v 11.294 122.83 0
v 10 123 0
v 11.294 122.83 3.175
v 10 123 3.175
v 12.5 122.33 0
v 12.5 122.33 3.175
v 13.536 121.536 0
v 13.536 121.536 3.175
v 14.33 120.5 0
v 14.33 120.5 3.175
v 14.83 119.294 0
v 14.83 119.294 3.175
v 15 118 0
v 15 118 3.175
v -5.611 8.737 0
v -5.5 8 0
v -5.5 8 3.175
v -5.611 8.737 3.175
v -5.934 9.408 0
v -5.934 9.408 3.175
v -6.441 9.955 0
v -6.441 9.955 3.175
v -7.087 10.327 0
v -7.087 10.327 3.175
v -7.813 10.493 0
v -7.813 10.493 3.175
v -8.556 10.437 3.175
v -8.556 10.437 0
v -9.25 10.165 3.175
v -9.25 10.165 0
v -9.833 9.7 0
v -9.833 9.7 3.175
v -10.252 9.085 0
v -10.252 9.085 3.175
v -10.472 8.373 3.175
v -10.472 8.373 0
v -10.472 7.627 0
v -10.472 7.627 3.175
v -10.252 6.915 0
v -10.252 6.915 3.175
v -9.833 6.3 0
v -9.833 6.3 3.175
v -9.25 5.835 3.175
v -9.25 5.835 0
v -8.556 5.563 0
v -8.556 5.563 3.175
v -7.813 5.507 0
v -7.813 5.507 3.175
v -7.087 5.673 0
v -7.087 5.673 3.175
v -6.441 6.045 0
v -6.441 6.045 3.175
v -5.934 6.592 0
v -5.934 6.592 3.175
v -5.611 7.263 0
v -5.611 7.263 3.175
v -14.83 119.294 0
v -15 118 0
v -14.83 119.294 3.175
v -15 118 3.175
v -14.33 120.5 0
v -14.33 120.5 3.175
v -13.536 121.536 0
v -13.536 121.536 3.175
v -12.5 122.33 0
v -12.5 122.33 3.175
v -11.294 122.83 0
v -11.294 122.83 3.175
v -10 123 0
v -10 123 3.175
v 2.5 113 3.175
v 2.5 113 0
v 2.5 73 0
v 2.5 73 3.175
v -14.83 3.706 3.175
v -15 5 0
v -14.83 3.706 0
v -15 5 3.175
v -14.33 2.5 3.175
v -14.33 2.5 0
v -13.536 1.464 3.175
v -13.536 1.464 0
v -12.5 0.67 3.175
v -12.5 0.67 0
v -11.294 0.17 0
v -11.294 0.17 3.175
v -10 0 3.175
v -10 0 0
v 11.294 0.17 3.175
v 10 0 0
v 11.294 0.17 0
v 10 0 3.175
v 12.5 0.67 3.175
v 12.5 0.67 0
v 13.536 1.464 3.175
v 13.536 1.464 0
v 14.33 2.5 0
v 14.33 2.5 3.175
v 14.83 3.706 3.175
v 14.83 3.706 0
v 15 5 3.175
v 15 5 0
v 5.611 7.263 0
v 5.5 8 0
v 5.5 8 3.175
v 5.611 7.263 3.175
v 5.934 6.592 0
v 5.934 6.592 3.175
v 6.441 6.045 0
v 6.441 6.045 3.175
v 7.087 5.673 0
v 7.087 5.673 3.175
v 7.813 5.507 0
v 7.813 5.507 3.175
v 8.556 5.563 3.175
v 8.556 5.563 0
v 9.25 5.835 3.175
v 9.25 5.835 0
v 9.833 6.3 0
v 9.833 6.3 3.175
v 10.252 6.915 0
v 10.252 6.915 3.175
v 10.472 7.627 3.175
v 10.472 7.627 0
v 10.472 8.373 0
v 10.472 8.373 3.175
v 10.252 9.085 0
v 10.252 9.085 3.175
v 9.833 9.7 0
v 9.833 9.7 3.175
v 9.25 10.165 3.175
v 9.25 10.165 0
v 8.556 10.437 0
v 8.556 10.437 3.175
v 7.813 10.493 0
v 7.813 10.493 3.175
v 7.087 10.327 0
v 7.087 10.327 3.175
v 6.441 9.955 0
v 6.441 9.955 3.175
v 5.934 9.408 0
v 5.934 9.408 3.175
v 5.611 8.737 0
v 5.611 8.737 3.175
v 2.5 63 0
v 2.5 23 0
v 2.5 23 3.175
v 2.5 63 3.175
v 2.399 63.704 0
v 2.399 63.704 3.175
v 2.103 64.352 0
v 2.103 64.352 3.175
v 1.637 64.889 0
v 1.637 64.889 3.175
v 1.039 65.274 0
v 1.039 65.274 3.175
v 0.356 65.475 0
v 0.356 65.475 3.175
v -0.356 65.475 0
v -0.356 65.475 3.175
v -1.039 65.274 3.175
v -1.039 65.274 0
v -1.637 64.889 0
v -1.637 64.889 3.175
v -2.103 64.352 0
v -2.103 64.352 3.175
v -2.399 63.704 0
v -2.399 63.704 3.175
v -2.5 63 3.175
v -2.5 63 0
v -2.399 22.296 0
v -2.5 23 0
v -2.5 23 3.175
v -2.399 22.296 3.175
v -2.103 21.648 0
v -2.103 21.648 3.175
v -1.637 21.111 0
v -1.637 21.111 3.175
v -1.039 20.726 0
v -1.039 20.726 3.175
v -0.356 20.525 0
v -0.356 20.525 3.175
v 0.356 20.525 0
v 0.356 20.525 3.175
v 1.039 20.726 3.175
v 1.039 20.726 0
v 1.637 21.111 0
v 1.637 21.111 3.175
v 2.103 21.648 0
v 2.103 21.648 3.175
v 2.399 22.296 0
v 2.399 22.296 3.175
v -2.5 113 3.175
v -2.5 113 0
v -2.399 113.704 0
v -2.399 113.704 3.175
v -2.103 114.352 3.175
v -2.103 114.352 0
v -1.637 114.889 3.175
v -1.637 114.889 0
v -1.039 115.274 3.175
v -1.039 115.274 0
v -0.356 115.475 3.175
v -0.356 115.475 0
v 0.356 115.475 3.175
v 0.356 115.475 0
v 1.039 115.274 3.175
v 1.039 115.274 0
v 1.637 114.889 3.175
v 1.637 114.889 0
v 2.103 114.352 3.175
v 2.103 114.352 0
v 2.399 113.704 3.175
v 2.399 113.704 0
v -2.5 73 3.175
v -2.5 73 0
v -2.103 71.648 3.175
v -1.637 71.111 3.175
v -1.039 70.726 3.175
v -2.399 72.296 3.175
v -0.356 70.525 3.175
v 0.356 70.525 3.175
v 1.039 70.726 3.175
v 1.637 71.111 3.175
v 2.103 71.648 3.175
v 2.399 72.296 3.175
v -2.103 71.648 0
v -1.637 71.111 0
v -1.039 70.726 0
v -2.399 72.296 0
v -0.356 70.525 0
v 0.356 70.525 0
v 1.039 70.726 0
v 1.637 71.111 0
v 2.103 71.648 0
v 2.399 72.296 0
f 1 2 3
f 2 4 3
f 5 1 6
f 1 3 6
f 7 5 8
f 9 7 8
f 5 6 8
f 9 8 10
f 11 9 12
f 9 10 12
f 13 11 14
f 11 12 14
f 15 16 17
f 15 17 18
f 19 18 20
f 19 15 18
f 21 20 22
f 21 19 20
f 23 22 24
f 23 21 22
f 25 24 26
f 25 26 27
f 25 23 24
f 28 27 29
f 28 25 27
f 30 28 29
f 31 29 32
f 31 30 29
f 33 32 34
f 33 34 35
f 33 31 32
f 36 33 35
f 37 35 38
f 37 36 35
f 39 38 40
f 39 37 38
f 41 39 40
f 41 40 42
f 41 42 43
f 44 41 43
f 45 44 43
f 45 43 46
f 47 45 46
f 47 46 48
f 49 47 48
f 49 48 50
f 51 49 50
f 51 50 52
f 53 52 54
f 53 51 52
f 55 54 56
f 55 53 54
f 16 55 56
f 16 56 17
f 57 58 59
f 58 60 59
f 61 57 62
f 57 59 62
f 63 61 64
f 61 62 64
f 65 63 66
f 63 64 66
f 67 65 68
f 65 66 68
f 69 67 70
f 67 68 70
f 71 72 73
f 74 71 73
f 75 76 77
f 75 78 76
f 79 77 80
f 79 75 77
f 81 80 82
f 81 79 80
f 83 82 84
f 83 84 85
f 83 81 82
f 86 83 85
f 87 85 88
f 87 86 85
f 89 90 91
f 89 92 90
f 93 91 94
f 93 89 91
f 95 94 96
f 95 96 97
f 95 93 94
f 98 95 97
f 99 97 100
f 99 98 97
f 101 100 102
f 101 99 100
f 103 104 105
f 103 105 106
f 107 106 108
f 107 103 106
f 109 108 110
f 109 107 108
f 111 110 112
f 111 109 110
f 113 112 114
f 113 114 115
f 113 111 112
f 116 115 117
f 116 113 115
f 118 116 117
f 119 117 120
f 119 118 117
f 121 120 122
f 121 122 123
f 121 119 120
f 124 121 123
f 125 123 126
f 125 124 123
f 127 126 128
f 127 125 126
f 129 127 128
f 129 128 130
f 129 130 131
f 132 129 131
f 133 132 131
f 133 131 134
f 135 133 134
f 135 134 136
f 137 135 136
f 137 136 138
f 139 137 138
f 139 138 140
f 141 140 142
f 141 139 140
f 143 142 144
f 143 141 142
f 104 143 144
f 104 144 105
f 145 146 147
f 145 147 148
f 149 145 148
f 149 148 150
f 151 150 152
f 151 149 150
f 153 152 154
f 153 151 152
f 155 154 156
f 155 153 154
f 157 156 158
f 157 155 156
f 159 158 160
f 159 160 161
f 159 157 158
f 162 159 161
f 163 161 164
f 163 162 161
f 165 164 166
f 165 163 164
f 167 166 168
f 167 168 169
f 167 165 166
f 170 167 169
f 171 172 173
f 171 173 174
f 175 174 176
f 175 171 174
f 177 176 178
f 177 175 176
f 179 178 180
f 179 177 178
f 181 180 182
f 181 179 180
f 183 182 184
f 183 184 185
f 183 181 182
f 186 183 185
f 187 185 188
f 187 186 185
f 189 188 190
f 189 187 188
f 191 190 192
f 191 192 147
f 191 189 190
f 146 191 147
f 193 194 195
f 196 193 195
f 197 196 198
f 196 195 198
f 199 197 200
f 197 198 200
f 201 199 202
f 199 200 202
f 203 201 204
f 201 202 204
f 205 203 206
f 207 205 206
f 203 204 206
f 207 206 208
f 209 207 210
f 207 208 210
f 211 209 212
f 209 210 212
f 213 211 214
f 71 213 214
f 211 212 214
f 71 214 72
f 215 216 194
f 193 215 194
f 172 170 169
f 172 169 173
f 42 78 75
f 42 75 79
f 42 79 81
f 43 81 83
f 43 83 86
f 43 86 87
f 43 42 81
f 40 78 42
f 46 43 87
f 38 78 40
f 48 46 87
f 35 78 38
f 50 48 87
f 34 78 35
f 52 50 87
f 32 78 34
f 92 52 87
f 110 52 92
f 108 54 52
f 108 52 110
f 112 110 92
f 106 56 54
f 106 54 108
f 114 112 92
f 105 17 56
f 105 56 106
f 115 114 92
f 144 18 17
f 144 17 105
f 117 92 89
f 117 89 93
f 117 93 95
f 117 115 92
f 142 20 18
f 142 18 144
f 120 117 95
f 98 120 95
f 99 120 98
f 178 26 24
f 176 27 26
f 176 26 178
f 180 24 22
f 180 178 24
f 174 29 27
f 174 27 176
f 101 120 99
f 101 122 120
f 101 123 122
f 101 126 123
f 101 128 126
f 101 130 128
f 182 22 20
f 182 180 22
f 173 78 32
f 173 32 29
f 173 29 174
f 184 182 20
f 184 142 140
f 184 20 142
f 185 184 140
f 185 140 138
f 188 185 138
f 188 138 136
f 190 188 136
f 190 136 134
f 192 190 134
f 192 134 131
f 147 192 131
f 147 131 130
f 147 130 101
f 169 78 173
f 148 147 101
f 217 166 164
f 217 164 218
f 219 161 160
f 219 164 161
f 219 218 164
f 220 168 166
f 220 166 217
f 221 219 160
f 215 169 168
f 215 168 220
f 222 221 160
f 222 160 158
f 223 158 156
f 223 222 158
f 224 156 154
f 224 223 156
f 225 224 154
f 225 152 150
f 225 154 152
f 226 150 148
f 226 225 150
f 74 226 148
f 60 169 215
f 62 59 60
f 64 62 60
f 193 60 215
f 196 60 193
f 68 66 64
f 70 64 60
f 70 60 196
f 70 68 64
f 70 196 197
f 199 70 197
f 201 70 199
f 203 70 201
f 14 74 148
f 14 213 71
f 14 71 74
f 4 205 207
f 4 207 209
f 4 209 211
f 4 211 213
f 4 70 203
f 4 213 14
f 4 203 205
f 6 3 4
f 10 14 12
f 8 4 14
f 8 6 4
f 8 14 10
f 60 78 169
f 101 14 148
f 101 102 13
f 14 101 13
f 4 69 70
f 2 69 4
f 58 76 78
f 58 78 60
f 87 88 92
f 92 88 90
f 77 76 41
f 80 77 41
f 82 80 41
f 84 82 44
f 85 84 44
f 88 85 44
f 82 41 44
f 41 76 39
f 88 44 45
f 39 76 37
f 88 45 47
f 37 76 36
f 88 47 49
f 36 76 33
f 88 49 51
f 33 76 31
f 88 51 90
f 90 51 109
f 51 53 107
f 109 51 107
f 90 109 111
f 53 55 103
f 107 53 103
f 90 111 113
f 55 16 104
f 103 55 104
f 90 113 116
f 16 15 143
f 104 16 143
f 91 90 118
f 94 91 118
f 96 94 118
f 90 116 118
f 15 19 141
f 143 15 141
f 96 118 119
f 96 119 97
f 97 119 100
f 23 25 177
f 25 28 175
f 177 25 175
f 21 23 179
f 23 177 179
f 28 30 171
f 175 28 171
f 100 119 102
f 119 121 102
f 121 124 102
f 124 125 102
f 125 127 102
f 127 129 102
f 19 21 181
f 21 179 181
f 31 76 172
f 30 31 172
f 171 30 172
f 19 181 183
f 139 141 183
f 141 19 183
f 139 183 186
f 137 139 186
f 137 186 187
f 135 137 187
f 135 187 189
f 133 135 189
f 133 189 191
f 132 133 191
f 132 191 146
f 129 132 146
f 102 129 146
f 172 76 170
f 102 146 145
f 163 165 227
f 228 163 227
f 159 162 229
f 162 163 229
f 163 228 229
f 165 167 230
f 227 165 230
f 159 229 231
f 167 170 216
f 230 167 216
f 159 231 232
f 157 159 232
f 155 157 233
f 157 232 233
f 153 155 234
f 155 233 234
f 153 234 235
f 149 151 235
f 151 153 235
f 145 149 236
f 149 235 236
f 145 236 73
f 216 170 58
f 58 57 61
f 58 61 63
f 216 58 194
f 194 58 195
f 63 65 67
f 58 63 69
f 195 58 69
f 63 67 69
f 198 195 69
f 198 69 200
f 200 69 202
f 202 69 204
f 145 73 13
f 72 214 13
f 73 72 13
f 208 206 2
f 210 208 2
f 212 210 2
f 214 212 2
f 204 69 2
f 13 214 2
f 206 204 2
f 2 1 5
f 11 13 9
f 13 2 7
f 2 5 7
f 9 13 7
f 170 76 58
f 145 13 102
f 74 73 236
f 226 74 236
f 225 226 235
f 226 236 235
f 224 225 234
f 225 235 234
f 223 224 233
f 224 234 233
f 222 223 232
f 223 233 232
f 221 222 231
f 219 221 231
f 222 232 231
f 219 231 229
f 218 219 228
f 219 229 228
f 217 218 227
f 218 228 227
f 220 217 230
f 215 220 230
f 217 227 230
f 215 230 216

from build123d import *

# Parameters (mm, degrees)
SKETCH1_W           = 30
SKETCH1_H           = 123
SKETCH1_R           = 2.5
BOSS_EXTRUDE1_DEPTH = 3.175
FILLET2_R           = 5


with BuildPart() as part:
    # Sketch1 → Boss-Extrude1 (new body)
    with BuildSketch(Plane.XY):
        with Locations((0, 61.5)):
            Rectangle(SKETCH1_W, SKETCH1_H)
        with Locations((-8, 8)):
            Circle(SKETCH1_R, mode=Mode.SUBTRACT)
        with Locations(Location((8, 8, 0), (0, 0, 180))):
            Circle(SKETCH1_R, mode=Mode.SUBTRACT)
        with BuildLine():
            Line((2.5, 113), (2.5, 73))
            ThreePointArc((2.5, 73), (0, 70.5), (-2.5, 73))
            Line((-2.5, 73), (-2.5, 113))
            ThreePointArc((-2.5, 113), (0, 115.5), (2.5, 113))
        make_face(mode=Mode.SUBTRACT)
        with BuildLine():
            Line((-2.5, 63), (-2.5, 23))
            ThreePointArc((-2.5, 23), (0, 20.5), (2.5, 23))
            Line((2.5, 23), (2.5, 63))
            ThreePointArc((2.5, 63), (0, 65.5), (-2.5, 63))
        make_face(mode=Mode.SUBTRACT)
    extrude(amount=BOSS_EXTRUDE1_DEPTH)

    # Fillet2
    fillet2_edges = [part.edges().sort_by_distance(p)[0] for p in [
        (15, 123, 1.5875),
        (15, 0, 1.5875),
        (-15, 0, 1.5875),
        (-15, 123, 1.5875),
    ]]
    fillet(fillet2_edges, radius=FILLET2_R)


solid = part.part
